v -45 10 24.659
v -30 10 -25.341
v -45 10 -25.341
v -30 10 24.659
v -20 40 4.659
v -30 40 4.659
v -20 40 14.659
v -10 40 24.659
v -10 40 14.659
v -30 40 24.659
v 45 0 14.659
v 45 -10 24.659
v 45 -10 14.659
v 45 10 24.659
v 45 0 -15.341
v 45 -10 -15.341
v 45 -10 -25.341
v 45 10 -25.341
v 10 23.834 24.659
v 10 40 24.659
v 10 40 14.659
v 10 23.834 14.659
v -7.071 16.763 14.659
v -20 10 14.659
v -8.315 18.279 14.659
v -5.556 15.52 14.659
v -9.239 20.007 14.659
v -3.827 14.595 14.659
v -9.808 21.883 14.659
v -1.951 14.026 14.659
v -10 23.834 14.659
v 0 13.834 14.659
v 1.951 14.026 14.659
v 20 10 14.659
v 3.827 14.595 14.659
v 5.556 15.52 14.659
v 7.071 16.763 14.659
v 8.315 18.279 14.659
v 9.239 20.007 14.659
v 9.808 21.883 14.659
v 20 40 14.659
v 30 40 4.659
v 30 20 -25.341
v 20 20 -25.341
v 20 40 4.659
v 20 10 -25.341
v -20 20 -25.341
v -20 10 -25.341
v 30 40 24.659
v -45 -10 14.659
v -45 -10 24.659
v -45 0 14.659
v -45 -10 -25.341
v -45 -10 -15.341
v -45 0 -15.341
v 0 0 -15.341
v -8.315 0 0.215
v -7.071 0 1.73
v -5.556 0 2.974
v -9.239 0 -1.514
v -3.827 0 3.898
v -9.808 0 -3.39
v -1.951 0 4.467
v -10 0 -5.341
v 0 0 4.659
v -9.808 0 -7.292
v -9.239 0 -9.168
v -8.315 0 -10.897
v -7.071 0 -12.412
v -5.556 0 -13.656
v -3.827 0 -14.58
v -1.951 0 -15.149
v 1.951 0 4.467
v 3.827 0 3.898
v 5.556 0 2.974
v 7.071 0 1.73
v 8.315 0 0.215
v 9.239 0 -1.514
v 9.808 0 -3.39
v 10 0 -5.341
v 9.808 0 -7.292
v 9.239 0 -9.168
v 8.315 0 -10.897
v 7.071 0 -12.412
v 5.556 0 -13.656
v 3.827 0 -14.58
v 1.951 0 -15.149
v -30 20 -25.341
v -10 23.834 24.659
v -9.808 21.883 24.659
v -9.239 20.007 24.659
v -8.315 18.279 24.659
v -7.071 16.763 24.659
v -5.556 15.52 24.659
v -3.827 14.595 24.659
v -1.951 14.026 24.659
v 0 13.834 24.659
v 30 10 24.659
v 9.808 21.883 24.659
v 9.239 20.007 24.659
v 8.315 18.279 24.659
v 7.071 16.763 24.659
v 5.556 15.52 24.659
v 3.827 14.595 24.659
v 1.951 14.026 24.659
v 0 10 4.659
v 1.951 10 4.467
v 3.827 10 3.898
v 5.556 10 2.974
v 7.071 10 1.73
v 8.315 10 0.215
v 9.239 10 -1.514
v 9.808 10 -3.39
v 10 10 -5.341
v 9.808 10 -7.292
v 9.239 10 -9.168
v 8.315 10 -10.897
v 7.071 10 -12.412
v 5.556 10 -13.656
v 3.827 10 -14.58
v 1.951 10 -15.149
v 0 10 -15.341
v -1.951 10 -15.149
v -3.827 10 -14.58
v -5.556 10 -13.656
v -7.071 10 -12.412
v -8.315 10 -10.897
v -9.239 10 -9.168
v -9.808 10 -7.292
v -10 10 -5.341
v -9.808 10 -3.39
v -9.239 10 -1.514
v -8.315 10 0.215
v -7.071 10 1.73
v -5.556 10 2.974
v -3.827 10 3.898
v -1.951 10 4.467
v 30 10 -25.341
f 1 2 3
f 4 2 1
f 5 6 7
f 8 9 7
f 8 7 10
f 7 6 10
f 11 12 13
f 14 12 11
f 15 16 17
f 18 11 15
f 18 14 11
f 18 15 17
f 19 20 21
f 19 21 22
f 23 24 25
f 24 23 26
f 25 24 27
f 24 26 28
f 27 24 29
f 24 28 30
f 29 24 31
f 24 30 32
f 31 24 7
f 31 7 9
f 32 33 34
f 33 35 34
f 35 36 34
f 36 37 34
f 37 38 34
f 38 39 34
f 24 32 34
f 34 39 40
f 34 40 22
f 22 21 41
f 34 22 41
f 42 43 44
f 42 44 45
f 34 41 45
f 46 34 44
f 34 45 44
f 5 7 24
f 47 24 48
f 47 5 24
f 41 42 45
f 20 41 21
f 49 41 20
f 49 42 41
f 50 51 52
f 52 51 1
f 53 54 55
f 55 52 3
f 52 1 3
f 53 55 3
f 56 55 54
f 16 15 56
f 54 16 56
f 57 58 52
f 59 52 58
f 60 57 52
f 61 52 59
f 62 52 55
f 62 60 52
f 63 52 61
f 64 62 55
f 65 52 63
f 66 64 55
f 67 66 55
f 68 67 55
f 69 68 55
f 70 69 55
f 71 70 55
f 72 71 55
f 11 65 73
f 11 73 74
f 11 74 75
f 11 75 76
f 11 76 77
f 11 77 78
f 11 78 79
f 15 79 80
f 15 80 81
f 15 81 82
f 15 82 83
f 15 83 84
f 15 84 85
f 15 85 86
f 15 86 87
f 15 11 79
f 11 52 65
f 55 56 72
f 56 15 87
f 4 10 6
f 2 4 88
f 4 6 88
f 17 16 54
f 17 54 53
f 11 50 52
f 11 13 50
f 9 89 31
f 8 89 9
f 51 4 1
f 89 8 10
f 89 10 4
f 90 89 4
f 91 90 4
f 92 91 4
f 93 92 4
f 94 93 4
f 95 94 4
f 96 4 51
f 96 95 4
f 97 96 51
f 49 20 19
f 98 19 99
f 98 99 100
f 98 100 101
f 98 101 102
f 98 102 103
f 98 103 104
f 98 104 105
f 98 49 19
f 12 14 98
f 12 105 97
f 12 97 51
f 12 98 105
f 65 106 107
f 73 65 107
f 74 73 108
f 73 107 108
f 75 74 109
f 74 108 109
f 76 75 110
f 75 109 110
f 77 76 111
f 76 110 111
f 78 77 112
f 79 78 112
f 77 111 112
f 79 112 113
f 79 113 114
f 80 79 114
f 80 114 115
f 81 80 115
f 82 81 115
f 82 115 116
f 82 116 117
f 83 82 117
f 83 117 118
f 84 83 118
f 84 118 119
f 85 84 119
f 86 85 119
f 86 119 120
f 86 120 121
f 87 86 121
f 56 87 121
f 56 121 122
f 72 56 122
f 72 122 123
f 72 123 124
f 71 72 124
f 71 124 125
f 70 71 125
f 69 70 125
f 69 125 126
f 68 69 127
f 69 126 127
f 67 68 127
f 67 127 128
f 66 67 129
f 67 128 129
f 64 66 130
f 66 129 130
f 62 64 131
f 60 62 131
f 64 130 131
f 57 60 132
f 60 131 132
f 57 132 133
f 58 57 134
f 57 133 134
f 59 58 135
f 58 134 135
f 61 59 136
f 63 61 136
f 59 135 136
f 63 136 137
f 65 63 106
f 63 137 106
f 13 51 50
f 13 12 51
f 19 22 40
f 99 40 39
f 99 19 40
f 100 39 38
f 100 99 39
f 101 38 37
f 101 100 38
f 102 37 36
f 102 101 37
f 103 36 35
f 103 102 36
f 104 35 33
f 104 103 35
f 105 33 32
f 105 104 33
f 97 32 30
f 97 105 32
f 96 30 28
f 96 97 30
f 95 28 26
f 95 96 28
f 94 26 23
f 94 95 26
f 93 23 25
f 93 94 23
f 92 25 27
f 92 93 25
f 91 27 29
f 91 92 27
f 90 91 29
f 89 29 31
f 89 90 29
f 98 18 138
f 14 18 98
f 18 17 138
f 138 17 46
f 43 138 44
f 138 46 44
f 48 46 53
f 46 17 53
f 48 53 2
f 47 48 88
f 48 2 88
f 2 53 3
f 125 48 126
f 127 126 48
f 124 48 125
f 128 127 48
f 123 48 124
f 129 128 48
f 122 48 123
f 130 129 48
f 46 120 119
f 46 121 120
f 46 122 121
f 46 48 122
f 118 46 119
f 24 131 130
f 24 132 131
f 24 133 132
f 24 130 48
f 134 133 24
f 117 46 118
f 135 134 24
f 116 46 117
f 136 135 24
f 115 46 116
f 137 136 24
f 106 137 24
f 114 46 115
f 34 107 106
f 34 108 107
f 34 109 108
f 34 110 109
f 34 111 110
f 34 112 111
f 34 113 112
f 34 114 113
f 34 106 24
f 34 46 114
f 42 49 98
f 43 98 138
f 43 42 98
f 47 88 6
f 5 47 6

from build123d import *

# Parameters (mm, degrees)
BOSS_EXTRUDE1_DEPTH = 45
SKETCH2_W           = 60
SKETCH2_H           = 30
BOSS_EXTRUDE2_DEPTH = 10
CUT_EXTRUDE1_DEPTH  = 79.262379212
SKETCH4_R           = 10
CUT_EXTRUDE2_DEPTH  = 10
BOSS_EXTRUDE3_DEPTH = 10


with BuildPart() as part:
    # Sketch1 → Boss-Extrude1 (new, symmetric)
    with BuildSketch(Plane(origin=(0, 0, 0), x_dir=(0, 0, -1), z_dir=(1, 0, 0))):
        Polygon((-14.659090909, 0), (15.340909091, 0), (15.340909091, -10), (25.340909091, -10), (25.340909091, 10), (-24.659090909, 10), (-24.659090909, -10), (-14.659090909, -10), align=None)
    extrude(amount=BOSS_EXTRUDE1_DEPTH, both=True)

    # Sketch2 → Boss-Extrude2 (add)
    with BuildSketch(Plane.XY.offset(24.659090909)):
        with Locations((0, 25)):
            Rectangle(SKETCH2_W, SKETCH2_H)
    extrude(amount=-BOSS_EXTRUDE2_DEPTH)

    # Sketch3 → Cut-Extrude1 (cut, through all)
    with BuildSketch(Plane.XY.offset(24.659090909)):
        with BuildLine():
            Line((-10, 23.834240346), (-10, 40))
            Line((-10, 40), (10, 40))
            Line((10, 40), (10, 23.834240346))
            ThreePointArc((10, 23.834240346), (0, 13.834240346), (-10, 23.834240346))
        make_face()
    extrude(amount=-CUT_EXTRUDE1_DEPTH, mode=Mode.SUBTRACT)

    # Sketch4 → Cut-Extrude2 (cut)
    with BuildSketch(Plane(origin=(0, 10, 0), x_dir=(1, 0, 0), z_dir=(0, 1, 0))):
        with Locations(Location((0, 5.340909091, 0), (0, 0, 270))):
            Circle(SKETCH4_R)
    extrude(amount=-CUT_EXTRUDE2_DEPTH, mode=Mode.SUBTRACT)

    # Sketch5 → Boss-Extrude3 (add)
    with BuildSketch(Plane(origin=(30, 0, 0), x_dir=(0, 0, -1), z_dir=(1, 0, 0))):
        Polygon((-14.659090909, 10), (25.340909091, 10), (25.340909091, 20), (-4.659090909, 40), (-14.659090909, 40), align=None)
    extrude(amount=-BOSS_EXTRUDE3_DEPTH)

    # Mirror1: part across plane


with BuildPart() as part_1:
    add(part.part)
    add(part.part.mirror(Plane(origin=(0, 0, 0), x_dir=(0, 0, 1), z_dir=(1, 0, 0))))


solid = part_1.part
